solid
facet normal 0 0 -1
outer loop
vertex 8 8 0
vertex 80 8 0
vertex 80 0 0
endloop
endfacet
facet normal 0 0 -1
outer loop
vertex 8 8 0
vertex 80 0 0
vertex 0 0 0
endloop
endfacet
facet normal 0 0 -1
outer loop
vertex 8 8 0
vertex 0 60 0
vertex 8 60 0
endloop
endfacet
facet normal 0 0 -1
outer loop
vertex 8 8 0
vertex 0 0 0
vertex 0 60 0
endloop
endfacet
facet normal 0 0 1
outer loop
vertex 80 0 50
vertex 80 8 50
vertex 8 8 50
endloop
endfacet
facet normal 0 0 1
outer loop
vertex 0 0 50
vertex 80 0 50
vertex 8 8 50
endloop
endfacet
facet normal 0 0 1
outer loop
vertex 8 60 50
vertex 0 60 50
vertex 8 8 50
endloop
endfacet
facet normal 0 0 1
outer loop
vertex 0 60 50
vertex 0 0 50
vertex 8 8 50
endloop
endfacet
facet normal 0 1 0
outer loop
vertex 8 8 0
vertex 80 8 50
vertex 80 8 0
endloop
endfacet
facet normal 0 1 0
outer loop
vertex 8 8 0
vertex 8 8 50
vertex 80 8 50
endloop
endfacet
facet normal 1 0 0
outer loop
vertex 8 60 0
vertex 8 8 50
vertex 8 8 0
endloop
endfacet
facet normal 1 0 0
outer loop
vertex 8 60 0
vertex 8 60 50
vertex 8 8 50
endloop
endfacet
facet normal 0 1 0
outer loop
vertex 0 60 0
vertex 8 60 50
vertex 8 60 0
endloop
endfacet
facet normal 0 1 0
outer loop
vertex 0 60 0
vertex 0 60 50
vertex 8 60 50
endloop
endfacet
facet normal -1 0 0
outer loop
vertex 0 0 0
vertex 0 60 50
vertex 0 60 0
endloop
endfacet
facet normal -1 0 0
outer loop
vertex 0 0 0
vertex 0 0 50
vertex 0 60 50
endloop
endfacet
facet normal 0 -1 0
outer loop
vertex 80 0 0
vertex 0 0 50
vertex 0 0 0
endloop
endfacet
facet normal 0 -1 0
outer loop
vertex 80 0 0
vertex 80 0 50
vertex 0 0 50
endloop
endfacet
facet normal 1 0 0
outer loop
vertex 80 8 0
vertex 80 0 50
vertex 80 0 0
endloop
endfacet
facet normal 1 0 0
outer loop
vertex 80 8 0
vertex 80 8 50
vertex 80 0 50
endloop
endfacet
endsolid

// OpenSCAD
$fn = 32;

// ----------------------------------------------------------------------
// Structural section: angle 80 x 60 mm
// ----------------------------------------------------------------------

// --- parameters (mm) ---
sec_w = 80;               // leg width, X
sec_h = 60;               // leg height, Y
flange_t = 8;             // leg thickness
plate_t = 50;             // cut length, Z (extrusion height)

profile = [[0, 0], [80, 0], [80, 8], [8, 8], [8, 60], [0, 60]];  // primary outline, 6 points, counter clockwise

// --- the one profile operation ---
linear_extrude(height = plate_t) polygon(points = profile);
